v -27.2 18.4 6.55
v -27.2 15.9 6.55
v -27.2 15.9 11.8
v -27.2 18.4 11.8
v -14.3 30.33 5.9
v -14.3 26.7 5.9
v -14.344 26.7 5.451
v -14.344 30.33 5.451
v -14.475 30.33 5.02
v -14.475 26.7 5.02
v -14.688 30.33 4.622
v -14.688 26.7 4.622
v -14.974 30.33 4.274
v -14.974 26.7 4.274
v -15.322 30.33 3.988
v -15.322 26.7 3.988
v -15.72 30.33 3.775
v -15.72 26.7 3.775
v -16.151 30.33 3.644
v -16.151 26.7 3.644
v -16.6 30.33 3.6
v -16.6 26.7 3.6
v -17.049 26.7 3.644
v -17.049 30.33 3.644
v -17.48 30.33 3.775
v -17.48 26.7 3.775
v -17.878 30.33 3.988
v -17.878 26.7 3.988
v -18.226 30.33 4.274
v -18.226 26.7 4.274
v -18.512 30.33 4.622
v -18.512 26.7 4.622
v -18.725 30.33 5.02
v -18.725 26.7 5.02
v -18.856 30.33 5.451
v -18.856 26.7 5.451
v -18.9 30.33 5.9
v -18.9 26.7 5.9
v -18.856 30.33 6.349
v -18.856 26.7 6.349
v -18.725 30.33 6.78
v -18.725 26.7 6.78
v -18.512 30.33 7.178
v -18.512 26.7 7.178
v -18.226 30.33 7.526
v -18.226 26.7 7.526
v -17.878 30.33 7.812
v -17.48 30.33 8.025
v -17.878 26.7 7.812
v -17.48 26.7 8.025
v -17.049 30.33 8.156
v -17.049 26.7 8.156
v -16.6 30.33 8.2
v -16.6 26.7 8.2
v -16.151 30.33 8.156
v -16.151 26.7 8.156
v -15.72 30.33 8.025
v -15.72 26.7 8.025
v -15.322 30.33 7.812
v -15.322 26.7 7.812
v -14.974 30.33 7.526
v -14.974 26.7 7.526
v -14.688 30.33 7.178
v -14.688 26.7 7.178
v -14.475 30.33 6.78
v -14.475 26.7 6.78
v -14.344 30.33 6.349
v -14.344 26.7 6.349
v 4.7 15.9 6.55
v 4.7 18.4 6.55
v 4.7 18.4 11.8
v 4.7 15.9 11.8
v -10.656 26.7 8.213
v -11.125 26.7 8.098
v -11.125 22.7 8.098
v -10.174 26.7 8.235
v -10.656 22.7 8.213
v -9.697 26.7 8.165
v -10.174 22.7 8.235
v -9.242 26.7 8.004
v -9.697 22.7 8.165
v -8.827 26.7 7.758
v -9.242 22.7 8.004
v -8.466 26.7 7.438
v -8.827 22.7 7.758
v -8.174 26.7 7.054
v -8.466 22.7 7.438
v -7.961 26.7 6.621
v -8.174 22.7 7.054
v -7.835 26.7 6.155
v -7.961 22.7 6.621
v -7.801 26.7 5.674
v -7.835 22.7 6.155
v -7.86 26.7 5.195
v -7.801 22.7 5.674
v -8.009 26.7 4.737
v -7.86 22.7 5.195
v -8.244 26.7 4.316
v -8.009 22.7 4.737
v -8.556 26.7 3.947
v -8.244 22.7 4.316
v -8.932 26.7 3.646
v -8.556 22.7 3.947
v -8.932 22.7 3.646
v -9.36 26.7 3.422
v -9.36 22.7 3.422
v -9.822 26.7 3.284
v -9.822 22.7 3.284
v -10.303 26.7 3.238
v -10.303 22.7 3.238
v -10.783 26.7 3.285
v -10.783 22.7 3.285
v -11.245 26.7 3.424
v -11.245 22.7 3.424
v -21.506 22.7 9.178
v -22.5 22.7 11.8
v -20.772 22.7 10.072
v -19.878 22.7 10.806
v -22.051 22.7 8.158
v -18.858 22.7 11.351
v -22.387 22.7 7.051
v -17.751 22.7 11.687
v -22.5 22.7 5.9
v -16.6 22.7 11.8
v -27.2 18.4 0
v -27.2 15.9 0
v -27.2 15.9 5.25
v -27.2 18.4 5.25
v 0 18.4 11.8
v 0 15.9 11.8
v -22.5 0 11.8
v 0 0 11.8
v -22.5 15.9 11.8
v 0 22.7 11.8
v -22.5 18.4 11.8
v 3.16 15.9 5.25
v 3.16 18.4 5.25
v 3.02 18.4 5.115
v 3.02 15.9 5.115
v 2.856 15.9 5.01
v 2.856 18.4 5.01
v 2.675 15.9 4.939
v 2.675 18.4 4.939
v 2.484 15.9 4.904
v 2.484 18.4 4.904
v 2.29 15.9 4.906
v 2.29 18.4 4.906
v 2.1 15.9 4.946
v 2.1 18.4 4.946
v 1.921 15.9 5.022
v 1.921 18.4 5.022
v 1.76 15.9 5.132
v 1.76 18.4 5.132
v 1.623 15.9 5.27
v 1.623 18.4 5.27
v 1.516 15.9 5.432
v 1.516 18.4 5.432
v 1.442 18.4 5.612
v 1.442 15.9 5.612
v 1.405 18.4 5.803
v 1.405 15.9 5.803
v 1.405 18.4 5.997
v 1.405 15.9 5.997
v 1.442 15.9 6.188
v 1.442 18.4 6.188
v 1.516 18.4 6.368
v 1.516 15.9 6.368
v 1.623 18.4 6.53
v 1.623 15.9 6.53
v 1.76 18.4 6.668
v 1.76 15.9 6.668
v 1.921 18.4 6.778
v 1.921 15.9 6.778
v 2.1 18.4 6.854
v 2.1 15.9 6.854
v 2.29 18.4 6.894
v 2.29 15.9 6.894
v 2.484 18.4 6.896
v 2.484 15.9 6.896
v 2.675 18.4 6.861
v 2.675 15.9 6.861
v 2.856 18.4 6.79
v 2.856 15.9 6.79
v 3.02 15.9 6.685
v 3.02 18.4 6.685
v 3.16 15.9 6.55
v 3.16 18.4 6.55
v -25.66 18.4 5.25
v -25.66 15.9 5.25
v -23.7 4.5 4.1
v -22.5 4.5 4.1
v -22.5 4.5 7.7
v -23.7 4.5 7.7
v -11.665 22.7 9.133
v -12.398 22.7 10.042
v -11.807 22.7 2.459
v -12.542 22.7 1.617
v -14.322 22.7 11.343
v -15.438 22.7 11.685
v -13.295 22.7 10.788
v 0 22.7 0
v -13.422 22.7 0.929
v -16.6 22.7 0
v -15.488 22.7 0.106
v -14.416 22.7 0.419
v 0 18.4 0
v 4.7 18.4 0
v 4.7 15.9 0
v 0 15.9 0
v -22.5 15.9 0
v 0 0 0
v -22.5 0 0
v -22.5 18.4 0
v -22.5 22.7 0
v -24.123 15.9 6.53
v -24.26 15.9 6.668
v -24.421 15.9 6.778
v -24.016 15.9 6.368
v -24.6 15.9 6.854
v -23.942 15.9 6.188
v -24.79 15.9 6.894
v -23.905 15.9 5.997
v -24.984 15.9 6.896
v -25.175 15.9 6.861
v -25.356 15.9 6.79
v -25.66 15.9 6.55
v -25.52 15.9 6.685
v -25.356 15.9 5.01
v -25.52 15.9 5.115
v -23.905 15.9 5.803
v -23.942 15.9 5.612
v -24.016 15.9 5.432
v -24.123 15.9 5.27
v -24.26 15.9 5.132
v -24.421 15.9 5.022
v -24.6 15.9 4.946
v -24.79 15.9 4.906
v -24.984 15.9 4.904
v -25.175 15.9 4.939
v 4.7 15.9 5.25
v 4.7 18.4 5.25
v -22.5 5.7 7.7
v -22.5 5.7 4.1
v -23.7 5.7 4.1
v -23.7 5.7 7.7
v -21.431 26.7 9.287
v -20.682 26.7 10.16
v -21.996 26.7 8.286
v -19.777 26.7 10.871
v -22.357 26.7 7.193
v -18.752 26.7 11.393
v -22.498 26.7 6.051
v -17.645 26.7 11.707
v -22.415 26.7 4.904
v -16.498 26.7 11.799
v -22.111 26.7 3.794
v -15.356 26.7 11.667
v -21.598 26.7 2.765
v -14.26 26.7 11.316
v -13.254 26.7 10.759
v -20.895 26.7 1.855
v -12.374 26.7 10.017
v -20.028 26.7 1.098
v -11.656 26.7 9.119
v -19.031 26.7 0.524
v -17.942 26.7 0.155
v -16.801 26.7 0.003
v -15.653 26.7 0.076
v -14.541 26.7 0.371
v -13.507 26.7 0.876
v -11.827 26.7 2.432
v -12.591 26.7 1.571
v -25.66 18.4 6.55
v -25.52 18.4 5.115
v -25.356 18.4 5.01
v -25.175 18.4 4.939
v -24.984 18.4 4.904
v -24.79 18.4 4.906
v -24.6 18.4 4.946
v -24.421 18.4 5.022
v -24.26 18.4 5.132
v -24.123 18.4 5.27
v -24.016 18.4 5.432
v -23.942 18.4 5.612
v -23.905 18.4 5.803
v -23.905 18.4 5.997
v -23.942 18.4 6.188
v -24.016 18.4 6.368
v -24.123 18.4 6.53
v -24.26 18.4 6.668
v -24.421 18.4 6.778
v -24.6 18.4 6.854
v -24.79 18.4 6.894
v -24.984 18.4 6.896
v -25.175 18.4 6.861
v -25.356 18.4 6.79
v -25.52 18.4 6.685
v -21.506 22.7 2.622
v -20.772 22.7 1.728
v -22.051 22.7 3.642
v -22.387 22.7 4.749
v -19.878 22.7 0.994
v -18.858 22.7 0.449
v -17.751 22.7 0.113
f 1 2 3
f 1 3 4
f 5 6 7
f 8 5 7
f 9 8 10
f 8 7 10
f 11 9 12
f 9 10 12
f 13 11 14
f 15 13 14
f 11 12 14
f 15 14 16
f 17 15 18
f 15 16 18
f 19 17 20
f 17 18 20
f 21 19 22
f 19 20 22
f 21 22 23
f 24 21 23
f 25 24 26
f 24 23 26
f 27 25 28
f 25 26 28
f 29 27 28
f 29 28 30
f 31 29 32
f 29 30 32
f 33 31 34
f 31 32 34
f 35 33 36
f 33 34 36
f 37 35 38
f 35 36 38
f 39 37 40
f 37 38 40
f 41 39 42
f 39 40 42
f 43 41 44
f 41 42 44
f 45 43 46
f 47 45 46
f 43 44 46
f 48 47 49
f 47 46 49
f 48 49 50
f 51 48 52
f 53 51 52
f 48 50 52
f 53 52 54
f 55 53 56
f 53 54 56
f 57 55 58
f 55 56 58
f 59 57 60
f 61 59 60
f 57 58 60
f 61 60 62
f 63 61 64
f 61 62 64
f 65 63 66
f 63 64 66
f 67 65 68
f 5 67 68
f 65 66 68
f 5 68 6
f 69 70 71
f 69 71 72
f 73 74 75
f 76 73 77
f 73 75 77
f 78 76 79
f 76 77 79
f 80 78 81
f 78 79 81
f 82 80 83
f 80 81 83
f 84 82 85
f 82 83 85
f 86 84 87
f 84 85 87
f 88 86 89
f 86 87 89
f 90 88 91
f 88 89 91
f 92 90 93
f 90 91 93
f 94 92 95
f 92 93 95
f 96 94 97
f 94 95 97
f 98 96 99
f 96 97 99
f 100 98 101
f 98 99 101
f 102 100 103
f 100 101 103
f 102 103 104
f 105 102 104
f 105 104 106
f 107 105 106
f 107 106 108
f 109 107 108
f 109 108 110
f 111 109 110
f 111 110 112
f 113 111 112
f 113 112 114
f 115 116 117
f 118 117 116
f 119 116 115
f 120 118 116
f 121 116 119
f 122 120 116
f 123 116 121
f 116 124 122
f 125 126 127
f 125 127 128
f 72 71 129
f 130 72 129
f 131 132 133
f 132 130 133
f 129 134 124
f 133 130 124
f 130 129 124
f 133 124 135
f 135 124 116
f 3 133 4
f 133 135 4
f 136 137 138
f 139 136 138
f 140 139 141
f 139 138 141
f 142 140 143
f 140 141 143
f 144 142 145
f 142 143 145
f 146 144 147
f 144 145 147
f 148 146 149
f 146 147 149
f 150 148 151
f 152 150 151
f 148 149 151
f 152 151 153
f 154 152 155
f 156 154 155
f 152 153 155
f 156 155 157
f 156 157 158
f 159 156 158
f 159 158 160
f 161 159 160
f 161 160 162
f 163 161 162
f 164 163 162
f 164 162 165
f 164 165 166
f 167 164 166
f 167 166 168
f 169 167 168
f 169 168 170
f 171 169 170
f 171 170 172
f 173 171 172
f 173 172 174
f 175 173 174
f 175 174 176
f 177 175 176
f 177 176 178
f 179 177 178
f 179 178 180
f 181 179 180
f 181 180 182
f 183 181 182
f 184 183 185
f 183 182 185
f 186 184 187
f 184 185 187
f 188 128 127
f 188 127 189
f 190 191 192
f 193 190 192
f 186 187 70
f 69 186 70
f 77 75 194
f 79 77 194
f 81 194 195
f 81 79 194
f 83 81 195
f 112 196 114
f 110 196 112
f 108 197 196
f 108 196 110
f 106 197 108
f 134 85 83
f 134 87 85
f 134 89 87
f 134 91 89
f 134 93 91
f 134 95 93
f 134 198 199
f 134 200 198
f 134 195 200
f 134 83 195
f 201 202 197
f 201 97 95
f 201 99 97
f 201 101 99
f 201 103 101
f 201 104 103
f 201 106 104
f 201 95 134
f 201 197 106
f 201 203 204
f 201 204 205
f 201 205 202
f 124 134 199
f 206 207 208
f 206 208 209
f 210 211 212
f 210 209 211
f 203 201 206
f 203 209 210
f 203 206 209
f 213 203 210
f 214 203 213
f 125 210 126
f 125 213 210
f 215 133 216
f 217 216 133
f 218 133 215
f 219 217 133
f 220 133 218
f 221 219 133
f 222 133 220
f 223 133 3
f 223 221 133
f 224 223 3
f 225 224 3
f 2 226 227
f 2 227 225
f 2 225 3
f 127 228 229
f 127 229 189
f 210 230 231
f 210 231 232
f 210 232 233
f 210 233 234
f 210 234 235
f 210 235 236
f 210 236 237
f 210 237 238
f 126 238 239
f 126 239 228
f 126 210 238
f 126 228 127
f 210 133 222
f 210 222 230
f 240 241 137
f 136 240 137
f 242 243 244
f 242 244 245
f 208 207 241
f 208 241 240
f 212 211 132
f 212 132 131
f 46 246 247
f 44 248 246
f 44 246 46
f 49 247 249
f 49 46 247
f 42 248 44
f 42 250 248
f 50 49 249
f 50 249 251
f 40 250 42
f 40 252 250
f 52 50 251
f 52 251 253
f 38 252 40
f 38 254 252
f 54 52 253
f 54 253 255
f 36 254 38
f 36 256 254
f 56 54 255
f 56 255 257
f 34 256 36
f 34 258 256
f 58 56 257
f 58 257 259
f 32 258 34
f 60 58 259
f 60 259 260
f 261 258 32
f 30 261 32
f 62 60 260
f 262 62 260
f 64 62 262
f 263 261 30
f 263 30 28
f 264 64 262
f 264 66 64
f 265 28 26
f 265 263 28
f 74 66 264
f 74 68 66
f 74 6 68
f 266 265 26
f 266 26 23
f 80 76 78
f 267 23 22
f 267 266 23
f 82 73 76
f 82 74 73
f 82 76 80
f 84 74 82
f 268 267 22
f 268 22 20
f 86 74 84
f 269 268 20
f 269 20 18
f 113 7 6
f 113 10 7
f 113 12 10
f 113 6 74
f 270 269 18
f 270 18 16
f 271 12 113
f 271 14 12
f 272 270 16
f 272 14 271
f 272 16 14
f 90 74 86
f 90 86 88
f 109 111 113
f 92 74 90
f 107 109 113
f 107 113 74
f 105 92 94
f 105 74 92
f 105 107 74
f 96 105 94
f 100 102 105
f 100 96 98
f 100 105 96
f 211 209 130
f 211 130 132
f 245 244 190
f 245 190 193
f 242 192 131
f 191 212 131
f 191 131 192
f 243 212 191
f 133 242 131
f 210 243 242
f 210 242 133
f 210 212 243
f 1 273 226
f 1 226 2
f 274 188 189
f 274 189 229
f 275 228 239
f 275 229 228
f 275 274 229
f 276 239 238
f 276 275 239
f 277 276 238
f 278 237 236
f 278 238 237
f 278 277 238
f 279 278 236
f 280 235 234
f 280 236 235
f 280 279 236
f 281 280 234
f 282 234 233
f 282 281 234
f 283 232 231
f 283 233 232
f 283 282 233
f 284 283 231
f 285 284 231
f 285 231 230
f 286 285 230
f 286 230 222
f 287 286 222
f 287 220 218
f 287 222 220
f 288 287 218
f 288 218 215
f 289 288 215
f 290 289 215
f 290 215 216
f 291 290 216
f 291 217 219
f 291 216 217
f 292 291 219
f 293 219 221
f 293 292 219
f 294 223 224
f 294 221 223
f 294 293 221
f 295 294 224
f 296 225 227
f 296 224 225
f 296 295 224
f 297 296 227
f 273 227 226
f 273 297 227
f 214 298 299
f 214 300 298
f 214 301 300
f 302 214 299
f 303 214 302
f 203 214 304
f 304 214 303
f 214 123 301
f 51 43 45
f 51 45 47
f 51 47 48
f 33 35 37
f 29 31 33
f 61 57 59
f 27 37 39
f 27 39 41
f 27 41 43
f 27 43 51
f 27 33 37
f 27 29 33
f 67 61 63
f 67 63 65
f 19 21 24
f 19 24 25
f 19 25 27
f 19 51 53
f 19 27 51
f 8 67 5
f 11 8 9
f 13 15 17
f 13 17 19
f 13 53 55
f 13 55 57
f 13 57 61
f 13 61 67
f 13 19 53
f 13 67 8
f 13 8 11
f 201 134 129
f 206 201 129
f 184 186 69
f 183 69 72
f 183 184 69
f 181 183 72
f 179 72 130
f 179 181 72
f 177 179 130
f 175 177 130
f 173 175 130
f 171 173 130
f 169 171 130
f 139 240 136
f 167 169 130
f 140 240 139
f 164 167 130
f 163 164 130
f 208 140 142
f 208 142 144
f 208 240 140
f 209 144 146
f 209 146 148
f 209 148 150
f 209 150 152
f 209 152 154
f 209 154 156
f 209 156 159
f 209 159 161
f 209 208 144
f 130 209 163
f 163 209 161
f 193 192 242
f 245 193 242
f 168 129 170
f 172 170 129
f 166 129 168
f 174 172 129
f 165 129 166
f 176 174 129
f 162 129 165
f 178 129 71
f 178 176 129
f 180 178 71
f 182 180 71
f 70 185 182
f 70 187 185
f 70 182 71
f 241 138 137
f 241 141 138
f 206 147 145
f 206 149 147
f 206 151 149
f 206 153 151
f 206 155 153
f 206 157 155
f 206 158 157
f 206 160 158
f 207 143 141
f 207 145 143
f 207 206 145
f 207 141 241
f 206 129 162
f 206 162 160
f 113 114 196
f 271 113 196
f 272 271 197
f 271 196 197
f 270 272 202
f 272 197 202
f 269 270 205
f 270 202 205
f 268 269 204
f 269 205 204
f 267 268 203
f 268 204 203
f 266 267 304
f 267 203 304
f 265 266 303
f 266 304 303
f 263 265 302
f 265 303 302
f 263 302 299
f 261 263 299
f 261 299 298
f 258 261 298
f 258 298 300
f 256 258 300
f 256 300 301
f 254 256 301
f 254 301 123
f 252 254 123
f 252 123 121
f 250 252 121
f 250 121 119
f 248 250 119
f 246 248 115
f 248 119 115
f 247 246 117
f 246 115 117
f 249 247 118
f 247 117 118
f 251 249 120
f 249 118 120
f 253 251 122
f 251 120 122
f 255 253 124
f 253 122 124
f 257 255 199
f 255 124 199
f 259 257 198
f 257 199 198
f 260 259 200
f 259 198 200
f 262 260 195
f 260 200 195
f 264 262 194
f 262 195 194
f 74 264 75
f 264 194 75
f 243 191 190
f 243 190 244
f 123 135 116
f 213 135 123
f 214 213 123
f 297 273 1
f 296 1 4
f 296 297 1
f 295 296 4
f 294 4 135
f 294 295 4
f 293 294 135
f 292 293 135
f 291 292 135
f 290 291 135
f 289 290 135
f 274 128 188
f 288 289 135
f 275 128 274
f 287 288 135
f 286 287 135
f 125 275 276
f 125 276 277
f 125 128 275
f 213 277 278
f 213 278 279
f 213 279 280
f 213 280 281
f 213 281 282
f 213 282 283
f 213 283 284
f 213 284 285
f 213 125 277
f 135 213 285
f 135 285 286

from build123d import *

# Parameters (mm, degrees)
BOSS_EXTRU_1_DEPTH      = 11.8
ESQUISSE2_R             = 5.9
BOSS_EXTRU_3_DEPTH      = 4
ESQUISSE3_R             = 2.5
BOSS_EXTRU_4_DEPTH      = 4
ESQUISSE5_R             = 2.3
BOSS_EXTRU_5_DEPTH      = 3.63
ENL_V_MAT_EXTRU_7_REACH = 20.4
ESQUISSE16_W            = 3.6
ESQUISSE16_H            = 1.2
BOSS_EXTRU_8_DEPTH      = 1.2


with BuildPart() as part:
    # Esquisse1 → Boss.-Extru.1 (new body)
    with BuildSketch(Plane.XY):
        Polygon((0, 0), (-22.5, 0), (-22.5, 15.9), (-27.2, 15.9), (-27.2, 18.4), (-22.5, 18.4), (-22.5, 22.7), (0, 22.7), (0, 18.4), (4.7, 18.4), (4.7, 15.9), (0, 15.9), align=None)
    extrude(amount=BOSS_EXTRU_1_DEPTH)

    # Esquisse2 → Boss.-Extru.3 (add)
    with BuildSketch(Plane(origin=(0, 22.7, 0), x_dir=(1, 0, 0), z_dir=(0, 1, 0))):
        with Locations((-16.6, -5.9)):
            Circle(ESQUISSE2_R)
    extrude(amount=BOSS_EXTRU_3_DEPTH)

    # Esquisse3 → Boss.-Extru.4 (add)
    with BuildSketch(Plane(origin=(0, 22.7, 0), x_dir=(1, 0, 0), z_dir=(0, 1, 0))):
        with Locations((-10.3, -5.738368037)):
            Circle(ESQUISSE3_R)
    extrude(amount=BOSS_EXTRU_4_DEPTH)

    # Esquisse5 → Boss.-Extru.5 (add)
    with BuildSketch(Plane(origin=(0, 26.7, 0), x_dir=(1, 0, 0), z_dir=(0, 1, 0))):
        with Locations((-16.6, -5.9)):
            Circle(ESQUISSE5_R)
    extrude(amount=BOSS_EXTRU_5_DEPTH)

    # Esquisse6 → Enlèv. mat.-Extru.7 (cut, up to next)
    with BuildSketch(Plane(origin=(0, 18.4, 0), x_dir=(1, 0, 0), z_dir=(0, 1, 0)), mode=Mode.PRIVATE) as enl_v_mat_extru_7_sk1:
        with BuildLine():
            Line((6.661887407, -5.9), (6.661887407, -5.25))
            Line((6.661887407, -5.25), (3.159934208, -5.25))
            ThreePointArc((3.159934208, -5.25), (1.4, -5.9), (3.159934208, -6.55))
            Line((3.159934208, -6.55), (6.661887407, -6.55))
            Line((6.661887407, -6.55), (6.661887407, -5.9))
        make_face()
    enl_v_mat_extru_7_tool1 = extrude(enl_v_mat_extru_7_sk1.sketch, amount=-ENL_V_MAT_EXTRU_7_REACH, mode=Mode.PRIVATE) & part.part
    add(enl_v_mat_extru_7_tool1.solids().sort_by_distance((3.903633, 18.4, 5.9))[0], mode=Mode.SUBTRACT)
    # Esquisse6 → Enlèv. mat.-Extru.7 (cut, up to next)
    with BuildSketch(Plane(origin=(0, 18.4, 0), x_dir=(1, 0, 0), z_dir=(0, 1, 0)), mode=Mode.PRIVATE) as enl_v_mat_extru_7_sk2:
        with BuildLine():
            Line((-29.161887407, -5.25), (-25.659934208, -5.25))
            ThreePointArc((-25.659934208, -5.25), (-23.9, -5.9), (-25.659934208, -6.55))
            Line((-25.659934208, -6.55), (-29.161887407, -6.55))
            Line((-29.161887407, -6.55), (-29.161887407, -5.9))
            Line((-29.161887407, -5.9), (-29.161887407, -5.25))
        make_face()
    enl_v_mat_extru_7_tool2 = extrude(enl_v_mat_extru_7_sk2.sketch, amount=-ENL_V_MAT_EXTRU_7_REACH, mode=Mode.PRIVATE) & part.part
    add(enl_v_mat_extru_7_tool2.solids().sort_by_distance((-26.403633, 18.4, 5.9))[0], mode=Mode.SUBTRACT)

    # Esquisse16 → Boss.-Extru.8 (add)
    with BuildSketch(Plane.ZY.offset(22.5)):
        with Locations((5.9, 5.1)):
            Rectangle(ESQUISSE16_W, ESQUISSE16_H)
    extrude(amount=BOSS_EXTRU_8_DEPTH)


solid = part.part
